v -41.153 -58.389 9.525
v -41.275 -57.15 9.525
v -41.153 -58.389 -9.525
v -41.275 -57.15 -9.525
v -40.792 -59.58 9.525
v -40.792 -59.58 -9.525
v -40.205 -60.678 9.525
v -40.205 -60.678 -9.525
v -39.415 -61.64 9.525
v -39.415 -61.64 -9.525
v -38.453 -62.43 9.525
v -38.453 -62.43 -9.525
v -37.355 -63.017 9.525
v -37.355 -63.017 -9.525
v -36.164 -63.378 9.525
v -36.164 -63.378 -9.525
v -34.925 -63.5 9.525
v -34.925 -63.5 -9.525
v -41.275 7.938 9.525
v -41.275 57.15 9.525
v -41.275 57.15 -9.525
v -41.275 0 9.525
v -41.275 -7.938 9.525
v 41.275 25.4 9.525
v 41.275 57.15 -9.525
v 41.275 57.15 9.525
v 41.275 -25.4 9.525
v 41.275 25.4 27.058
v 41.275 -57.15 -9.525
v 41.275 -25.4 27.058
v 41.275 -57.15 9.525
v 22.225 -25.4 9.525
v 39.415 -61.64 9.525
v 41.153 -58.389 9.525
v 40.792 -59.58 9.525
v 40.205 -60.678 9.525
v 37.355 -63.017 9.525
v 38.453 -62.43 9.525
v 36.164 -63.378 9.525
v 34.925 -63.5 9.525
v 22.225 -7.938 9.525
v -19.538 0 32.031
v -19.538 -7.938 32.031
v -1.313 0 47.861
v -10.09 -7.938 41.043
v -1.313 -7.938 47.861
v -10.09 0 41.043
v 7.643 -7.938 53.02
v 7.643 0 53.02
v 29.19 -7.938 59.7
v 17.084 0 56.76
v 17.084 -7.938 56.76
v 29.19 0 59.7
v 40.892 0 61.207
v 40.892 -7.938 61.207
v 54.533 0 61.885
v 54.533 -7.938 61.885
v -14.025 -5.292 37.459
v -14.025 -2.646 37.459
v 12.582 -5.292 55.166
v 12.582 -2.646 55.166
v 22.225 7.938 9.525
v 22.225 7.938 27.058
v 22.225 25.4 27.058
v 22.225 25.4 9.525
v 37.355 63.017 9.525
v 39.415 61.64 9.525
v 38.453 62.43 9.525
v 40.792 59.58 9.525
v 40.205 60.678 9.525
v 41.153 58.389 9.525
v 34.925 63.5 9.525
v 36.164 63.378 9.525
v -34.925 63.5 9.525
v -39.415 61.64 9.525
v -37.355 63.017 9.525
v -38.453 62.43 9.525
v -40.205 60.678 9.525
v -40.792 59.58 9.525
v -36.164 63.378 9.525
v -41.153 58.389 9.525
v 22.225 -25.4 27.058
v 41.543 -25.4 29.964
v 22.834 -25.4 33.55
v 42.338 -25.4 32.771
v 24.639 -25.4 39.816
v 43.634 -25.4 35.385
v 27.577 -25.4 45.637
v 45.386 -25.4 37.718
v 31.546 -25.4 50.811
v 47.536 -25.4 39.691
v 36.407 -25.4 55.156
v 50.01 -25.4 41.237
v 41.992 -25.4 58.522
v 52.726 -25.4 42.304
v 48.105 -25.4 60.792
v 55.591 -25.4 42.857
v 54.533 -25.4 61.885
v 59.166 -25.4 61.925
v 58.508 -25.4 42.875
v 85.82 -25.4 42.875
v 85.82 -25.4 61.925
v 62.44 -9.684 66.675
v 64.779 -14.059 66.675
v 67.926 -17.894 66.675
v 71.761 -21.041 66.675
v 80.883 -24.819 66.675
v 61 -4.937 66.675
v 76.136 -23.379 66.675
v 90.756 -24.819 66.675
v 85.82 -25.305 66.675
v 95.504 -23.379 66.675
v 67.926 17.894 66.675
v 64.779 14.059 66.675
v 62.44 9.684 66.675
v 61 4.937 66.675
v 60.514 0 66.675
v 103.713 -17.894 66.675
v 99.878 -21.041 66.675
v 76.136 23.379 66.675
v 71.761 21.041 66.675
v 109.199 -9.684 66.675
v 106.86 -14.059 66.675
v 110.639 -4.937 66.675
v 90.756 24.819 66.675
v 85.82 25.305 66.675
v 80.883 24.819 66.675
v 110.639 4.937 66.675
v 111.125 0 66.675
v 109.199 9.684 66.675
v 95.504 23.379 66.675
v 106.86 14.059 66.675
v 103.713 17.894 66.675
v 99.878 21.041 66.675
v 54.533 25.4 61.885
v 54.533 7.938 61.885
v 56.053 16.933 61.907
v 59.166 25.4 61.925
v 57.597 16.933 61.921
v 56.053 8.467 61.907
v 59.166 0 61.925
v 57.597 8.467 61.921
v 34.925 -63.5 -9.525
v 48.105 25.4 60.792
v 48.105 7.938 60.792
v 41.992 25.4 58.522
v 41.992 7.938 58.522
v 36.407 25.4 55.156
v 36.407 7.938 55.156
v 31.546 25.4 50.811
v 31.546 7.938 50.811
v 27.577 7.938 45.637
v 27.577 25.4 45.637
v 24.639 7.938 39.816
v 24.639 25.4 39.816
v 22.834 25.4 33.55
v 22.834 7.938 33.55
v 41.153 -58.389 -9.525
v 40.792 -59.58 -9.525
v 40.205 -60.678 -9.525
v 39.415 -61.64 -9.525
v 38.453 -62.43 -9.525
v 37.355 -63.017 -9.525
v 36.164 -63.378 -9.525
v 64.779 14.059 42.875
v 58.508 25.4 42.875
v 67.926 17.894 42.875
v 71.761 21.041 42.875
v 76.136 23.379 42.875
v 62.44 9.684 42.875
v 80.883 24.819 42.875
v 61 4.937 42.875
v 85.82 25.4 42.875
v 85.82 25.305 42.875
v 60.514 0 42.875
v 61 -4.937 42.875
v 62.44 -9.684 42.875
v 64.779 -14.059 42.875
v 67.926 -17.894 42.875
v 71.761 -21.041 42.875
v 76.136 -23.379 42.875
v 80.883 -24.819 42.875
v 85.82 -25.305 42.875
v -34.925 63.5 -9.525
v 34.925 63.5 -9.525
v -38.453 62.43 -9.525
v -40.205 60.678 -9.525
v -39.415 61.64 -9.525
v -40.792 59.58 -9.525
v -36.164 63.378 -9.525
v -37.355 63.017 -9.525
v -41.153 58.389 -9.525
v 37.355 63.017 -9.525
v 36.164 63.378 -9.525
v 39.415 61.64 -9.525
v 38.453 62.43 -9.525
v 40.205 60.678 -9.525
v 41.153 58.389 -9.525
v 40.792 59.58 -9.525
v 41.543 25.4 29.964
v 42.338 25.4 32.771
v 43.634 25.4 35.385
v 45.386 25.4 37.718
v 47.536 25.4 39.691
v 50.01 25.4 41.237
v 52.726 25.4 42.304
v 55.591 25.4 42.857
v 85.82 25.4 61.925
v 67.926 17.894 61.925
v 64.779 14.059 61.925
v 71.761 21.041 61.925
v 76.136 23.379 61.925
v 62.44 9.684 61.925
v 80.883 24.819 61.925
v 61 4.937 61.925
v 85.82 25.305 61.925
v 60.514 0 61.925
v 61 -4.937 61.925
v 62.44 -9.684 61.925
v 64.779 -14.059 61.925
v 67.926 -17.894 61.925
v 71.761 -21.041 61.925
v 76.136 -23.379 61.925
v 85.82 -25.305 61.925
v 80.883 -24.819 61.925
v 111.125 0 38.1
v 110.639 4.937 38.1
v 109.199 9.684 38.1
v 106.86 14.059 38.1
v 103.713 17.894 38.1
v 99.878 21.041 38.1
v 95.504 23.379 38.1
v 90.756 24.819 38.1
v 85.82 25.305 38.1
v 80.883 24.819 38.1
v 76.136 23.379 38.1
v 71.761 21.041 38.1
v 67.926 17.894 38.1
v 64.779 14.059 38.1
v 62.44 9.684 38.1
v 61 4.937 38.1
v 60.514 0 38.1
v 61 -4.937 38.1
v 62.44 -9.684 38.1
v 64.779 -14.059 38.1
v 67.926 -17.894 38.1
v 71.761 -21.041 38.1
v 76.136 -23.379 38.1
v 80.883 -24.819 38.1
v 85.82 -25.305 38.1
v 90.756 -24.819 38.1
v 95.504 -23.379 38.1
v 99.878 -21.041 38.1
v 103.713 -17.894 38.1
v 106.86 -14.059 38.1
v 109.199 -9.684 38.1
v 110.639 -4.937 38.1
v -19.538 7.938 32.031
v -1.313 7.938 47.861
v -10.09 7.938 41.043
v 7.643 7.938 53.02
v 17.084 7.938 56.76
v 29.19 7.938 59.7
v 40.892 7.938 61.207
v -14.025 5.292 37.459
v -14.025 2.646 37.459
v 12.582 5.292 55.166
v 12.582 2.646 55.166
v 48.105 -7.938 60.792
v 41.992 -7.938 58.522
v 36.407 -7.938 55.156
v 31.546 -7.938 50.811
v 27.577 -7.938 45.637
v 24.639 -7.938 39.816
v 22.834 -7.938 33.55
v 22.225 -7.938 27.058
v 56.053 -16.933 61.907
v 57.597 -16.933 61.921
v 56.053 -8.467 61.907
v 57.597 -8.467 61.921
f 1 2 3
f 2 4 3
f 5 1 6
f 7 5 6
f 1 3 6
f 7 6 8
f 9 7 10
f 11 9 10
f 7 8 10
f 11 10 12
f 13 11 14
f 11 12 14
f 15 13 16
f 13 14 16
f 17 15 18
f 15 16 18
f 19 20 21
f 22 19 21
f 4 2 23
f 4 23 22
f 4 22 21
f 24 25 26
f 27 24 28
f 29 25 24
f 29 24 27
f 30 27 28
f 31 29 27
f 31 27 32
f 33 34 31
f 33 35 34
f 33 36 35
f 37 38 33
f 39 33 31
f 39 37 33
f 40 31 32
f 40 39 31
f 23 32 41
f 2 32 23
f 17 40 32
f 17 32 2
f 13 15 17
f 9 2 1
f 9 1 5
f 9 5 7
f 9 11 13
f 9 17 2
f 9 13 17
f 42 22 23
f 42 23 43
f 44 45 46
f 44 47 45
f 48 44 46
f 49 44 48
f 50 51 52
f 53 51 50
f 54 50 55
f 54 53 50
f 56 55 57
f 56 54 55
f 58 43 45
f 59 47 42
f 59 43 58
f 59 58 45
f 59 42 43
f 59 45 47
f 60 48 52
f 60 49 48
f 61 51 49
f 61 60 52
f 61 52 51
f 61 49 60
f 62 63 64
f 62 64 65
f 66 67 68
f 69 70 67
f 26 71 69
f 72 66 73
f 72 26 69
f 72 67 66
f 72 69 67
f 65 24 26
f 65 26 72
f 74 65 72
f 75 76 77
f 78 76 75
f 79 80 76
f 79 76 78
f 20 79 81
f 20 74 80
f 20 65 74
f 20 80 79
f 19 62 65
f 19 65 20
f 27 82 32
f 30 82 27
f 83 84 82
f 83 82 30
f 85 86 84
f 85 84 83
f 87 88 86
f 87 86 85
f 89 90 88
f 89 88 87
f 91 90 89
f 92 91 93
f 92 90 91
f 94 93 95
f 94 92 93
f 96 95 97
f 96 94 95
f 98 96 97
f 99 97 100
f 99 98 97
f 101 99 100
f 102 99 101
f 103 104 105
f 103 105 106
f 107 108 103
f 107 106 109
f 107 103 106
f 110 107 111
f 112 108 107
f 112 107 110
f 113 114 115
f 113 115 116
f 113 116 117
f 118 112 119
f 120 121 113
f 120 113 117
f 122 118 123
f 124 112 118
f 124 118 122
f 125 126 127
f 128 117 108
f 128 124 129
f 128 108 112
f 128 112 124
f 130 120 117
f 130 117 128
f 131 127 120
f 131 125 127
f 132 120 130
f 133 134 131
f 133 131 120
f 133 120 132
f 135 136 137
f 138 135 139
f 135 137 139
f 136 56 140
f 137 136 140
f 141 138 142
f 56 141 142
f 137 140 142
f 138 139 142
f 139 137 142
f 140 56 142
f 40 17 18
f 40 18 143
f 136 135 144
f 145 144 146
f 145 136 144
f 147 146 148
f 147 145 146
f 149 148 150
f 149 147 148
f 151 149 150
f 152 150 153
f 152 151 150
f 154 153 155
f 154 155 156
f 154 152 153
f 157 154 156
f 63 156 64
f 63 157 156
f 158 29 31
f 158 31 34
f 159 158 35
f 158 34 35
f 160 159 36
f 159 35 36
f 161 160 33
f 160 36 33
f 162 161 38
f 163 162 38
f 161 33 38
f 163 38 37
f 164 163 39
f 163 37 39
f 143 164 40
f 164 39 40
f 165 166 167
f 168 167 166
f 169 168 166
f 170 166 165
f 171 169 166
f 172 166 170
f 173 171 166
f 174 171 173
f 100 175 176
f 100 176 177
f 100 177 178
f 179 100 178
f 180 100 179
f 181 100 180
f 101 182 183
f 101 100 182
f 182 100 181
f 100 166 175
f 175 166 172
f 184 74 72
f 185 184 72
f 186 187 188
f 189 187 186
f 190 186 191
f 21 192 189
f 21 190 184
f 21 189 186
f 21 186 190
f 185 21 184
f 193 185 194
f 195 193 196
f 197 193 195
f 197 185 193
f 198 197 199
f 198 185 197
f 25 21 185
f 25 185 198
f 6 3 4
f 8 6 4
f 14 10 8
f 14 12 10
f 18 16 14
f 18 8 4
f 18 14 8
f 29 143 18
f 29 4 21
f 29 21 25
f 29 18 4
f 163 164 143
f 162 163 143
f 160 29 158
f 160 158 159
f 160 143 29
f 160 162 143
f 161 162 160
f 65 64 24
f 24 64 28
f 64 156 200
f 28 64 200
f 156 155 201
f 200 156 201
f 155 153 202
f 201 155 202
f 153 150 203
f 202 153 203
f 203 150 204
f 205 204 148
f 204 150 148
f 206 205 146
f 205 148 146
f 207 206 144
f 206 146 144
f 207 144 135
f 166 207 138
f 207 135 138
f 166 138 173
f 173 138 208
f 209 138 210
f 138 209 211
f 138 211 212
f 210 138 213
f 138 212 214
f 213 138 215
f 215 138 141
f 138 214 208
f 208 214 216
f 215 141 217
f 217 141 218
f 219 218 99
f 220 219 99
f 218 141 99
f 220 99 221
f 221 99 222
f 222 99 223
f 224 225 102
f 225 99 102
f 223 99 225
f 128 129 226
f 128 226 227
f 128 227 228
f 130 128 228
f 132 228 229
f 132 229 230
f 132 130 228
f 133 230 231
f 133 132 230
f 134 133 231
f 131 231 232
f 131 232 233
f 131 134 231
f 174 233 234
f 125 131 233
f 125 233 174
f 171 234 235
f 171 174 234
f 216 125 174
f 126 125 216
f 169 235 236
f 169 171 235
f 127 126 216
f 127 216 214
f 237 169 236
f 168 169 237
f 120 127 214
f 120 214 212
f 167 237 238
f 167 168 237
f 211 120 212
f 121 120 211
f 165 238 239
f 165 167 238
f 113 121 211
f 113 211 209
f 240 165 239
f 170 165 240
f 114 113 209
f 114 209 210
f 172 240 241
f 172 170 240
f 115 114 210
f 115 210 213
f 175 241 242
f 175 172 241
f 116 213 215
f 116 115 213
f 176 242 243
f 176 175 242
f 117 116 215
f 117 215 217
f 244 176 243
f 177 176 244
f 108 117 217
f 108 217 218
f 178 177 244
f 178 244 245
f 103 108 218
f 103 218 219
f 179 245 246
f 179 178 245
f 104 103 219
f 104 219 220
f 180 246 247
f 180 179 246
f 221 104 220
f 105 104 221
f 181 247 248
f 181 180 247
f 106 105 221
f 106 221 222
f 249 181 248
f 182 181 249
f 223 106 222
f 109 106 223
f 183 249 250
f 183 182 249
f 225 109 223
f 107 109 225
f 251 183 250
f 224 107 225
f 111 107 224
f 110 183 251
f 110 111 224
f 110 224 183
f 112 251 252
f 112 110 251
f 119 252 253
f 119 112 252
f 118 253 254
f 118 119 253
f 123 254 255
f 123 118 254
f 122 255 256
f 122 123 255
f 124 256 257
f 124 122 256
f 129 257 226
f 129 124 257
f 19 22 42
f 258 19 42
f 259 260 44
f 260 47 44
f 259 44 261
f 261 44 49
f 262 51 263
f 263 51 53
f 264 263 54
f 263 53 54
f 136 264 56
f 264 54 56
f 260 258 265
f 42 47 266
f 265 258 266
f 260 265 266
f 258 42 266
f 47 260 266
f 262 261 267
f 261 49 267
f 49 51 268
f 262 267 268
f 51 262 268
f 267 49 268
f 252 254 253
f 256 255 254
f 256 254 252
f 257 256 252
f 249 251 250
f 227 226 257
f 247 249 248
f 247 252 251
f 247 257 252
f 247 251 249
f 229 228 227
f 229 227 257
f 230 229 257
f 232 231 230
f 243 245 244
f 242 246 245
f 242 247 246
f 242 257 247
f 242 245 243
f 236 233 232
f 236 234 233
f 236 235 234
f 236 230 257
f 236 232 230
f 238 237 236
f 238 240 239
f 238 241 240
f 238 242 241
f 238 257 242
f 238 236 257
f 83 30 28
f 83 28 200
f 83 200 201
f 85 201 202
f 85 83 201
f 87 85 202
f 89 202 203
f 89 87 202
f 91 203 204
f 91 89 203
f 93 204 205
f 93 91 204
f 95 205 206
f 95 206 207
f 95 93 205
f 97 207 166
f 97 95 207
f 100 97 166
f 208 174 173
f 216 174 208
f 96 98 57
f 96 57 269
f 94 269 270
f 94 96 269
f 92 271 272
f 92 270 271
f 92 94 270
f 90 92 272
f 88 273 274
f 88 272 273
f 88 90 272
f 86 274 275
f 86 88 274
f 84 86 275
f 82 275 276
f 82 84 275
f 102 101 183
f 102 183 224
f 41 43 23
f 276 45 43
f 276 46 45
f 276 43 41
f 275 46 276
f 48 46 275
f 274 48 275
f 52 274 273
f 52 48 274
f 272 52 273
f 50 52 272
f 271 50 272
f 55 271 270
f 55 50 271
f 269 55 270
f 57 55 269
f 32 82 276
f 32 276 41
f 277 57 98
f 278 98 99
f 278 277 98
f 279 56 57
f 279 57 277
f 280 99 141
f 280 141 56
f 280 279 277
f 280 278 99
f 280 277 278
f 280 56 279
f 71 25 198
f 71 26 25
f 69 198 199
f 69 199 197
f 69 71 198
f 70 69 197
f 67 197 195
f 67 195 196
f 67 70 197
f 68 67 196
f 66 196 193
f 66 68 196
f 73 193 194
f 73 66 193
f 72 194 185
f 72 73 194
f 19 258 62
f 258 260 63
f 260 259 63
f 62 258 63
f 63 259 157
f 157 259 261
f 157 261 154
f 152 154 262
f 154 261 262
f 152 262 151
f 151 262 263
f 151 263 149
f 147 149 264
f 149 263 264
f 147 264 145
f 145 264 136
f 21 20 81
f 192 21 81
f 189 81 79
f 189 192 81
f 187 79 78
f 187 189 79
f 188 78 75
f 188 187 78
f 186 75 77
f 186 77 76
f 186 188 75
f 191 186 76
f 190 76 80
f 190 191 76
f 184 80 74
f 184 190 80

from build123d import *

# Parameters (mm, degrees)
F1_DEPTH = 63.5
F2_DEPTH = 25.4
F3_DEPTH = 7.9375
F0_W     = 25.4945200562
F0_H     = 19.05
F4_DEPTH = 25.4
F6_R     = 6.35


with BuildPart() as f1:
    # F0 (on Front) → F1 (new body, symmetric)
    with BuildSketch(Plane.XZ):
        Polygon((41.275, -9.525), (41.275, 9.525), (22.225, 9.525), (-41.275, 9.525), (-41.275, -9.525), align=None)
    extrude(amount=F1_DEPTH, both=True)

    # F0 (on Front) → F2 (join, symmetric)
    with BuildSketch(Plane.XZ):
        with BuildLine():
            Line((22.225, 9.525), (41.275, 9.525))
            Line((41.275, 9.525), (41.275, 27.0584095458))
            ThreePointArc((41.275, 27.0584095458), (46.4156191601, 38.7540793849), (58.5082211633, 42.8752))
            Line((58.5082211633, 42.8752), (60.325, 42.8752))
            Line((60.325, 42.8752), (60.325, 61.9252))
            Line((60.325, 61.9252), (59.1655764496, 61.9252))
            add(Edge.make_bspline(
                [(54.5329264401, 61.8852174814), (56.041241649, 61.9118488453), (57.5849624427, 61.9252), (59.1655764496, 61.9252)],
                knots=[110.2611541265, 110.2611541265, 110.2611541265, 110.2611541265, 113.2876443288, 113.2876443288, 113.2876443288, 113.2876443288], degree=3))
            ThreePointArc((54.5329264401, 61.8852174814), (31.5457335676, 50.8108234328), (22.225, 27.0584095458))
            Line((22.225, 27.0584095458), (22.225, 9.525))
        make_face()
    extrude(amount=F2_DEPTH, both=True)

    # F0 (on Front) → F3 (join, symmetric)
    with BuildSketch(Plane.XZ):
        with BuildLine():
            Line((-41.275, 9.525), (22.225, 9.525))
            Line((22.225, 9.525), (22.225, 27.0584095458))
            ThreePointArc((22.225, 27.0584095458), (31.5457335676, 50.8108234328), (54.5329264401, 61.8852174814))
            add(Edge.make_bspline(
                [(-41.275, 9.525), (-8.3754615169, 42.3180313799), (-0.4180446882, 60.9149830772), (54.5329264401, 61.8852174814)],
                knots=[0, 0, 0, 0, 110.2611541265, 110.2611541265, 110.2611541265, 110.2611541265], degree=3))
        make_face()
    extrude(amount=F3_DEPTH, both=True)

    # F0 (on Front) → F4 (join, symmetric)
    with BuildSketch(Plane.XZ):
        with Locations((73.0722600281, 52.4002)):
            Rectangle(F0_W, F0_H)
    extrude(amount=F4_DEPTH, both=True)

    # F0 (on Front) → F5 (revolve)
    with BuildSketch(Plane.XZ):
        Polygon((85.8195200562, 61.9252), (85.8195200562, 42.8752), (85.8195200562, 38.1), (111.125, 38.1), (111.125, 66.675), (85.8195200562, 66.675), align=None)
    revolve(axis=Axis((85.8195200562, 0, 52.3875), (0, 0, 1)))

    # F6
    f6_edges = [f1.edges().sort_by_distance(p)[0] for p in [
        (41.275, -63.5, 0),
        (-41.275, -63.5, 0),
        (41.275, 63.5, 0),
        (-41.275, 63.5, 0),
    ]]
    fillet(f6_edges, radius=F6_R)


solid = f1.part
